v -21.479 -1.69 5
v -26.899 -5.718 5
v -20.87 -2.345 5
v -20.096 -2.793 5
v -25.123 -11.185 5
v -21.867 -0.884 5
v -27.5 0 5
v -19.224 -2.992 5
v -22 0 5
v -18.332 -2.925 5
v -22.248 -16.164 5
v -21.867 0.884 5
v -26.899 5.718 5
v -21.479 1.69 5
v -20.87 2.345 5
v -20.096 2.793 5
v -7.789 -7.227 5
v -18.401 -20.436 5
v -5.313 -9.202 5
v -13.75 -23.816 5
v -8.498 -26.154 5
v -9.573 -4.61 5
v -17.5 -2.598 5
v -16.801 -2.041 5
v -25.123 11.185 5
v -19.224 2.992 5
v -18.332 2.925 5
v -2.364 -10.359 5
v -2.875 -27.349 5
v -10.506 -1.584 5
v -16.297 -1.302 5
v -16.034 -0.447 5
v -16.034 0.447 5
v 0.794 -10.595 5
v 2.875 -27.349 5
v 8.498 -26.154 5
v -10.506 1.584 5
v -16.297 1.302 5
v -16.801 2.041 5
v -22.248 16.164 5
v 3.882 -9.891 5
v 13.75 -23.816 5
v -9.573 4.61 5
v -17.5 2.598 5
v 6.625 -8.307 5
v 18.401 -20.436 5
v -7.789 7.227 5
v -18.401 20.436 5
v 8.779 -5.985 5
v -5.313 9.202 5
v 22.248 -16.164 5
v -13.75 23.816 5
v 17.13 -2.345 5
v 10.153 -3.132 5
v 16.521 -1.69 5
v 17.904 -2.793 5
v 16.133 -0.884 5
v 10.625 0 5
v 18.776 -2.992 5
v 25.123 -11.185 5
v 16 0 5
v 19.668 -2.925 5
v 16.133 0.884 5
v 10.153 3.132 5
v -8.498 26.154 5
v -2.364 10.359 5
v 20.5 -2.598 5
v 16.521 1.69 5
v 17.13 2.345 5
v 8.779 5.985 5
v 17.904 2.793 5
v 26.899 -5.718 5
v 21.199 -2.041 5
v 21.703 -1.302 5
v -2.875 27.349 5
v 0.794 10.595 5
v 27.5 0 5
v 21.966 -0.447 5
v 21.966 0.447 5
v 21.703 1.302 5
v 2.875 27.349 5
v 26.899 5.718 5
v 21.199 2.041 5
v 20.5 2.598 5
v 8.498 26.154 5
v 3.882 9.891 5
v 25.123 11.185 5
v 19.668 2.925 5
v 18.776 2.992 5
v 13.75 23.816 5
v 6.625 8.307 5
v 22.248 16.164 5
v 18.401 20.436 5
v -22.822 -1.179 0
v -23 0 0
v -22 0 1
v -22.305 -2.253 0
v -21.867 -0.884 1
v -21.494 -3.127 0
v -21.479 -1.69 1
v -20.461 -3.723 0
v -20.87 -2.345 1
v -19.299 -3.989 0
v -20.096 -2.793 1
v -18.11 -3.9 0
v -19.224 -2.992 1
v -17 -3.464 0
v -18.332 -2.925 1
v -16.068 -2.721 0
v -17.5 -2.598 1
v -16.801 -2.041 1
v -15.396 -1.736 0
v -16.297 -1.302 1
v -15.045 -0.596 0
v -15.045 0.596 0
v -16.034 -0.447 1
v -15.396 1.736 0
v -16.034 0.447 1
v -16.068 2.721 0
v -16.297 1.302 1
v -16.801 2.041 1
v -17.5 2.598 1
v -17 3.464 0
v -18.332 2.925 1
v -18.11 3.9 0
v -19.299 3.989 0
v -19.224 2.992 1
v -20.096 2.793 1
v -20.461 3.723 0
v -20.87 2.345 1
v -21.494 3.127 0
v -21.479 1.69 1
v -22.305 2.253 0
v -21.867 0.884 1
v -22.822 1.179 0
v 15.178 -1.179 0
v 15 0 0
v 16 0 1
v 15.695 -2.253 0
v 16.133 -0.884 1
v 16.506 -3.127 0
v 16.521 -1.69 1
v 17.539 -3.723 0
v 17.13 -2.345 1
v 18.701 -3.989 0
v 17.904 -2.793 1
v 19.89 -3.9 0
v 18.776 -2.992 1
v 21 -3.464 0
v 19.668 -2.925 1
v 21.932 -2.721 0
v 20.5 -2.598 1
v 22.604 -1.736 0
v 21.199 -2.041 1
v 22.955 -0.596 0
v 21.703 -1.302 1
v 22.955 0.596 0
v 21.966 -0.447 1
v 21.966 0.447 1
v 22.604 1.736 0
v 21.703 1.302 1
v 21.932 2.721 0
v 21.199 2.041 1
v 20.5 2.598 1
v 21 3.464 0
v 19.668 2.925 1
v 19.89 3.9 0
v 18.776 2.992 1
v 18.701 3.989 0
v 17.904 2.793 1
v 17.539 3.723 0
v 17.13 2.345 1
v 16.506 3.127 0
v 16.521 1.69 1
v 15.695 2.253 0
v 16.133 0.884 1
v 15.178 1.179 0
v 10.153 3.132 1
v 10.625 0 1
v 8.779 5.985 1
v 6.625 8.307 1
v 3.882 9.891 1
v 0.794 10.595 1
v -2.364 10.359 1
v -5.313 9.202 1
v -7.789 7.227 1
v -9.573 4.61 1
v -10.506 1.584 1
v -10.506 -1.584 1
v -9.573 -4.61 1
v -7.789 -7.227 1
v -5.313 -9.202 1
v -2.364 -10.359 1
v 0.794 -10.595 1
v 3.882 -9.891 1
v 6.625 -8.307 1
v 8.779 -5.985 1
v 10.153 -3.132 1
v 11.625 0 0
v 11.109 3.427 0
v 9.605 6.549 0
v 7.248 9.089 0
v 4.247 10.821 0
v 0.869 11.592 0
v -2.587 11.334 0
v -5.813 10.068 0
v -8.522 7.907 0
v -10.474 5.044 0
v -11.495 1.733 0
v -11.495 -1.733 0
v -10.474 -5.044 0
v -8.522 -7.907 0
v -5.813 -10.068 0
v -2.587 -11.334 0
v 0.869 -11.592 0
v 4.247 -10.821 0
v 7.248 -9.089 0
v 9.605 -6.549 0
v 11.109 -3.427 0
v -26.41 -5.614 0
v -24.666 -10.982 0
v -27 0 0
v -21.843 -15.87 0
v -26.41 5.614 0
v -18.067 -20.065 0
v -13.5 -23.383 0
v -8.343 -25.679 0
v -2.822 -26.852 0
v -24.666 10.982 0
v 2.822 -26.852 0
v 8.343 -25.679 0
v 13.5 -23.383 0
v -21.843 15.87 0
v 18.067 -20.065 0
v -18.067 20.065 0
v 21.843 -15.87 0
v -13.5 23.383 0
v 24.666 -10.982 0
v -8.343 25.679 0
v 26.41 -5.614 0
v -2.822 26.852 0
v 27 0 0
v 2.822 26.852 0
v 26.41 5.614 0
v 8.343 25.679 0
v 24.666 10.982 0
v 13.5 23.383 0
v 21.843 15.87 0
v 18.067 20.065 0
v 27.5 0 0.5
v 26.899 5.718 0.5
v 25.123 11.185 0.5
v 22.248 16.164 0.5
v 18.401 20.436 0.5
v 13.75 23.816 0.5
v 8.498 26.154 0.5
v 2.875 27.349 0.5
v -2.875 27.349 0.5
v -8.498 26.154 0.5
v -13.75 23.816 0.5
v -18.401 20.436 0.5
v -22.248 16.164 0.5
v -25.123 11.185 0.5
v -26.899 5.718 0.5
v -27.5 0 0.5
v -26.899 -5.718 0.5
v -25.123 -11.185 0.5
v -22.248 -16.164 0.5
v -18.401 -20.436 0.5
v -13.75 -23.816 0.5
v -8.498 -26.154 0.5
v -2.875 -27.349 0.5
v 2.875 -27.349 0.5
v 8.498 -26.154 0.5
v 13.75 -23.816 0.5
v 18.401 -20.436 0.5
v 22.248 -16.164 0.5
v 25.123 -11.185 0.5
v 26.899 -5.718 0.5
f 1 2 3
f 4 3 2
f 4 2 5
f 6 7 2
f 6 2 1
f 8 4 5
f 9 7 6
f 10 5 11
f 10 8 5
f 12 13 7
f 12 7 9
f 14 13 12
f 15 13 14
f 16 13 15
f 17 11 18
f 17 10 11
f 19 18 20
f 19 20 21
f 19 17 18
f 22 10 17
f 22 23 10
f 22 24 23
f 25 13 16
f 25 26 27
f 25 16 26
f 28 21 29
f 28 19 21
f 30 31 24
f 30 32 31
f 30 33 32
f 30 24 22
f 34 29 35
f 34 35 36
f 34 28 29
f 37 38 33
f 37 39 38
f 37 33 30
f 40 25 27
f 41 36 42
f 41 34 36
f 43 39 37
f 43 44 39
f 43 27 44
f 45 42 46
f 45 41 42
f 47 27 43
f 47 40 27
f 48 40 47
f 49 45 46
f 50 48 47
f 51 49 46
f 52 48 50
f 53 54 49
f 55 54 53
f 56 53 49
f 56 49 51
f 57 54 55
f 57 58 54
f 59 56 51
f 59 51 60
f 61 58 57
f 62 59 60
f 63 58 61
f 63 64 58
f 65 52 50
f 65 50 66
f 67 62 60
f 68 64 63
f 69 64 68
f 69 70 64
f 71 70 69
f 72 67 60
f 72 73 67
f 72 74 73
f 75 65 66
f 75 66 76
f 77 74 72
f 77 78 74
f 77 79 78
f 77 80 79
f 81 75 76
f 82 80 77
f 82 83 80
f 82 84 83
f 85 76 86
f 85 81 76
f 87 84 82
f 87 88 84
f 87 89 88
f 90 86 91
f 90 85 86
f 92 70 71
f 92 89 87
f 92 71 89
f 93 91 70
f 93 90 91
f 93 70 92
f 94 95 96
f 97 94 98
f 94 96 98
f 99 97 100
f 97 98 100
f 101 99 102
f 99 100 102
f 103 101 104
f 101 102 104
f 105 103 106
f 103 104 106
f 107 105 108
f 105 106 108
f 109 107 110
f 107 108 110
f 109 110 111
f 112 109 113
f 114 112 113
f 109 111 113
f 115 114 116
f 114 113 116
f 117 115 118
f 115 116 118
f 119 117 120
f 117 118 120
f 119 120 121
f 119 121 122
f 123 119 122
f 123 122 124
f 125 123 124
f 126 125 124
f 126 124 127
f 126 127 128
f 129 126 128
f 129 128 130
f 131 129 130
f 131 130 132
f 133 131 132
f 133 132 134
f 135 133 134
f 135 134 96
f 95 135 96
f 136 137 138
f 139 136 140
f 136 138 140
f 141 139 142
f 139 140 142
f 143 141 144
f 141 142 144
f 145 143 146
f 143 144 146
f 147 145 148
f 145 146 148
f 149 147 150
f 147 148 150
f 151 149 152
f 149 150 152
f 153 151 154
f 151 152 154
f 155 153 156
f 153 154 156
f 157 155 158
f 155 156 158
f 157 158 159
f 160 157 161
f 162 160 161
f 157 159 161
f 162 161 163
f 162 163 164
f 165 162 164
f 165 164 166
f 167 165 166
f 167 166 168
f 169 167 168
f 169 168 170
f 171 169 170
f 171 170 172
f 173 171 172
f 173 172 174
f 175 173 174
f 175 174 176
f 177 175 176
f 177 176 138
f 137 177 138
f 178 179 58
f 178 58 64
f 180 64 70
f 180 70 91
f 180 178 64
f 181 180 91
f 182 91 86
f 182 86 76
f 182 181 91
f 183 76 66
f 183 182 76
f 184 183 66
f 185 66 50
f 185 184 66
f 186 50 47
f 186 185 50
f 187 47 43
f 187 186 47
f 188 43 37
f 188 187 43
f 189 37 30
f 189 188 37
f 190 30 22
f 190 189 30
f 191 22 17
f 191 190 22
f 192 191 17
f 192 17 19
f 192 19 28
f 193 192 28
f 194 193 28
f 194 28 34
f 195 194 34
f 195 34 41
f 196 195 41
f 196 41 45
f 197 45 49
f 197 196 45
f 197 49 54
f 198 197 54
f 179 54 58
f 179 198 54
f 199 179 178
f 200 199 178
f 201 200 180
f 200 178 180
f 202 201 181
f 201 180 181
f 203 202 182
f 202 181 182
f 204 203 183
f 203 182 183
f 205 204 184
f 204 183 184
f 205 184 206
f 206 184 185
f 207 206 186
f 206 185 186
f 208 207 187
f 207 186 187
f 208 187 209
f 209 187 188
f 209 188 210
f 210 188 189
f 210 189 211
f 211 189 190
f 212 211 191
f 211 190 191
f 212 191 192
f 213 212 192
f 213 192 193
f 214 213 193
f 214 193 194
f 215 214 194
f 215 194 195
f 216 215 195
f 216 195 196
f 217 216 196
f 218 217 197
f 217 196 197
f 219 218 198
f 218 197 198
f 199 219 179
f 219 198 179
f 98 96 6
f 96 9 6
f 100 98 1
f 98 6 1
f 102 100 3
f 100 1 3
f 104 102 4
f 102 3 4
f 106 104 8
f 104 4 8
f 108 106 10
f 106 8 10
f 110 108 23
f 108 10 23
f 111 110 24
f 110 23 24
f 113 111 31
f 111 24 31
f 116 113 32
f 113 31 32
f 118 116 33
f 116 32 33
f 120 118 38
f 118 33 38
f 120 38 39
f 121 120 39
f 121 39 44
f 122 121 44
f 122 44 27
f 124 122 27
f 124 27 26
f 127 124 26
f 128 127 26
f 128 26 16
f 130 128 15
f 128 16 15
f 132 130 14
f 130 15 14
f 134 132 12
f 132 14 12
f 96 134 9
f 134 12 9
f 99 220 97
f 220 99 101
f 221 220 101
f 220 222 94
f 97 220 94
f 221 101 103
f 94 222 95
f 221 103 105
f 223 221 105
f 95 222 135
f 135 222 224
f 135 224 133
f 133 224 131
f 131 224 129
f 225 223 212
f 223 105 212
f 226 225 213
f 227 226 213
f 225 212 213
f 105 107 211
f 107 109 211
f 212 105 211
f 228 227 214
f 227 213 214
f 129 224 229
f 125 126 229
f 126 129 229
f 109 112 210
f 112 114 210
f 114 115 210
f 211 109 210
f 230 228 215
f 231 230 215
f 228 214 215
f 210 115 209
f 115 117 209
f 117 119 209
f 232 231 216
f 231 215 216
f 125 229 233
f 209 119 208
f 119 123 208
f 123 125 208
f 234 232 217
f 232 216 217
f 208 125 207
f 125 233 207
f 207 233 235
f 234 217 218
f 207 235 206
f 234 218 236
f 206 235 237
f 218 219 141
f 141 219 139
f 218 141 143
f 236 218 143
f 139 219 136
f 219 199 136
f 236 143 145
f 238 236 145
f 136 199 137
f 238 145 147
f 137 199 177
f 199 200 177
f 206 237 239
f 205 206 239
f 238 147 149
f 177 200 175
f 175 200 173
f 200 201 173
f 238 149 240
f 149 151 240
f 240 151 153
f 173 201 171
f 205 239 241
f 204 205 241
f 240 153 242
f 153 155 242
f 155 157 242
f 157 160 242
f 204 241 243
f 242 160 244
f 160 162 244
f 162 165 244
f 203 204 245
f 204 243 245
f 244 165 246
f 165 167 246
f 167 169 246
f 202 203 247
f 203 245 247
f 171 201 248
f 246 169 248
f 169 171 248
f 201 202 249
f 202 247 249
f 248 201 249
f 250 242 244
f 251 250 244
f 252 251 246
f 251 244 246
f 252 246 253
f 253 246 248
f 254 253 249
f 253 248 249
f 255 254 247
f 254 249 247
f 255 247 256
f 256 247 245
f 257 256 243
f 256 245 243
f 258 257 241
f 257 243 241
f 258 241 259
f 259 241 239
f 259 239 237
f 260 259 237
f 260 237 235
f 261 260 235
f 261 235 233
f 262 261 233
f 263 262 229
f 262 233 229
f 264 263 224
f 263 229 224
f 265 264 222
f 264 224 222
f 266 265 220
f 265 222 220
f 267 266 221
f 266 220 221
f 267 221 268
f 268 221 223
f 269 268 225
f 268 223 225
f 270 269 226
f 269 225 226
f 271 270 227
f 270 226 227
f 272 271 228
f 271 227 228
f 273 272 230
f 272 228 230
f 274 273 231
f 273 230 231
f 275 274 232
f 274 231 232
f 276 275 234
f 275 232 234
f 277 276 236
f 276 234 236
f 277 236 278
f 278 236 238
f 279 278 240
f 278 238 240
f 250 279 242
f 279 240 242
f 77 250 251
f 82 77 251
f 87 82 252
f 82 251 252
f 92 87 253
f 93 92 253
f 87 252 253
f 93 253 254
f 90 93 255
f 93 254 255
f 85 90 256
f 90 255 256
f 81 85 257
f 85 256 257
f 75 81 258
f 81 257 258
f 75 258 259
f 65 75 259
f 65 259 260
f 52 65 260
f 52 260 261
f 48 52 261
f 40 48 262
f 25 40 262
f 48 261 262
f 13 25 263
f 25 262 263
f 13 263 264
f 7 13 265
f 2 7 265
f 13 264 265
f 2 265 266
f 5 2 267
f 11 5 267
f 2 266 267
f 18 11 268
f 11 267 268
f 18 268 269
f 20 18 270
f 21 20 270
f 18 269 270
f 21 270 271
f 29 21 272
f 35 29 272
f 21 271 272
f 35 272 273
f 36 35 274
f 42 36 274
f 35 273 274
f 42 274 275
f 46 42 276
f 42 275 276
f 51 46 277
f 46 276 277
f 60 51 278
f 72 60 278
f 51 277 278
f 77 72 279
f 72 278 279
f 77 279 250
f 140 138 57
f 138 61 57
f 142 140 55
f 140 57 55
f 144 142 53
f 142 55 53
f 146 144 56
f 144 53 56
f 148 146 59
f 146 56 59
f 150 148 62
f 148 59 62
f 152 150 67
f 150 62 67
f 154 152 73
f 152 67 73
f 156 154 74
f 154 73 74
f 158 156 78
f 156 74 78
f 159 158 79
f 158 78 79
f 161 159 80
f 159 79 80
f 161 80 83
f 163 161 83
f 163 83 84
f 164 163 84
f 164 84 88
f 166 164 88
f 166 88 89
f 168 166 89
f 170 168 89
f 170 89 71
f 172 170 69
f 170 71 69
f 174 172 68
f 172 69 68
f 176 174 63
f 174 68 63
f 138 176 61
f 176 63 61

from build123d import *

# Parameters (mm, degrees)
SKETCH_R         = 27.5
SKETCH_R_2       = 10.625
PAD_DEPTH        = 5
CHAMFER_SIZE     = 0.5
CHAMFER001_SIZE  = 1
HOLE_D           = 6
HOLE_CSINK_D     = 8
HOLE_CSINK_ANGLE = 90


with BuildPart() as part:
    # Sketch → Pad (new body)
    with BuildSketch(Plane.XY):
        Circle(SKETCH_R)
        Circle(SKETCH_R_2, mode=Mode.SUBTRACT)
    extrude(amount=PAD_DEPTH)

    # Chamfer
    chamfer_edges = [part.edges().sort_by_distance(p)[0] for p in [
        (-27.5, 0, 0),
    ]]
    chamfer(chamfer_edges, length=CHAMFER_SIZE)

    # Chamfer001
    chamfer001_edges = [part.edges().sort_by_distance(p)[0] for p in [
        (-10.625, 0, 0),
    ]]
    chamfer(chamfer001_edges, length=CHAMFER001_SIZE)

    # Hole (through all)
    with Locations(Plane(origin=(0, 0, 0), x_dir=(1, 0, 0), z_dir=(0, 0, -1))):
        with Locations((-19, 0), (19, 0)):
            CounterSinkHole(HOLE_D / 2, HOLE_CSINK_D / 2, counter_sink_angle=HOLE_CSINK_ANGLE)


solid = part.part
